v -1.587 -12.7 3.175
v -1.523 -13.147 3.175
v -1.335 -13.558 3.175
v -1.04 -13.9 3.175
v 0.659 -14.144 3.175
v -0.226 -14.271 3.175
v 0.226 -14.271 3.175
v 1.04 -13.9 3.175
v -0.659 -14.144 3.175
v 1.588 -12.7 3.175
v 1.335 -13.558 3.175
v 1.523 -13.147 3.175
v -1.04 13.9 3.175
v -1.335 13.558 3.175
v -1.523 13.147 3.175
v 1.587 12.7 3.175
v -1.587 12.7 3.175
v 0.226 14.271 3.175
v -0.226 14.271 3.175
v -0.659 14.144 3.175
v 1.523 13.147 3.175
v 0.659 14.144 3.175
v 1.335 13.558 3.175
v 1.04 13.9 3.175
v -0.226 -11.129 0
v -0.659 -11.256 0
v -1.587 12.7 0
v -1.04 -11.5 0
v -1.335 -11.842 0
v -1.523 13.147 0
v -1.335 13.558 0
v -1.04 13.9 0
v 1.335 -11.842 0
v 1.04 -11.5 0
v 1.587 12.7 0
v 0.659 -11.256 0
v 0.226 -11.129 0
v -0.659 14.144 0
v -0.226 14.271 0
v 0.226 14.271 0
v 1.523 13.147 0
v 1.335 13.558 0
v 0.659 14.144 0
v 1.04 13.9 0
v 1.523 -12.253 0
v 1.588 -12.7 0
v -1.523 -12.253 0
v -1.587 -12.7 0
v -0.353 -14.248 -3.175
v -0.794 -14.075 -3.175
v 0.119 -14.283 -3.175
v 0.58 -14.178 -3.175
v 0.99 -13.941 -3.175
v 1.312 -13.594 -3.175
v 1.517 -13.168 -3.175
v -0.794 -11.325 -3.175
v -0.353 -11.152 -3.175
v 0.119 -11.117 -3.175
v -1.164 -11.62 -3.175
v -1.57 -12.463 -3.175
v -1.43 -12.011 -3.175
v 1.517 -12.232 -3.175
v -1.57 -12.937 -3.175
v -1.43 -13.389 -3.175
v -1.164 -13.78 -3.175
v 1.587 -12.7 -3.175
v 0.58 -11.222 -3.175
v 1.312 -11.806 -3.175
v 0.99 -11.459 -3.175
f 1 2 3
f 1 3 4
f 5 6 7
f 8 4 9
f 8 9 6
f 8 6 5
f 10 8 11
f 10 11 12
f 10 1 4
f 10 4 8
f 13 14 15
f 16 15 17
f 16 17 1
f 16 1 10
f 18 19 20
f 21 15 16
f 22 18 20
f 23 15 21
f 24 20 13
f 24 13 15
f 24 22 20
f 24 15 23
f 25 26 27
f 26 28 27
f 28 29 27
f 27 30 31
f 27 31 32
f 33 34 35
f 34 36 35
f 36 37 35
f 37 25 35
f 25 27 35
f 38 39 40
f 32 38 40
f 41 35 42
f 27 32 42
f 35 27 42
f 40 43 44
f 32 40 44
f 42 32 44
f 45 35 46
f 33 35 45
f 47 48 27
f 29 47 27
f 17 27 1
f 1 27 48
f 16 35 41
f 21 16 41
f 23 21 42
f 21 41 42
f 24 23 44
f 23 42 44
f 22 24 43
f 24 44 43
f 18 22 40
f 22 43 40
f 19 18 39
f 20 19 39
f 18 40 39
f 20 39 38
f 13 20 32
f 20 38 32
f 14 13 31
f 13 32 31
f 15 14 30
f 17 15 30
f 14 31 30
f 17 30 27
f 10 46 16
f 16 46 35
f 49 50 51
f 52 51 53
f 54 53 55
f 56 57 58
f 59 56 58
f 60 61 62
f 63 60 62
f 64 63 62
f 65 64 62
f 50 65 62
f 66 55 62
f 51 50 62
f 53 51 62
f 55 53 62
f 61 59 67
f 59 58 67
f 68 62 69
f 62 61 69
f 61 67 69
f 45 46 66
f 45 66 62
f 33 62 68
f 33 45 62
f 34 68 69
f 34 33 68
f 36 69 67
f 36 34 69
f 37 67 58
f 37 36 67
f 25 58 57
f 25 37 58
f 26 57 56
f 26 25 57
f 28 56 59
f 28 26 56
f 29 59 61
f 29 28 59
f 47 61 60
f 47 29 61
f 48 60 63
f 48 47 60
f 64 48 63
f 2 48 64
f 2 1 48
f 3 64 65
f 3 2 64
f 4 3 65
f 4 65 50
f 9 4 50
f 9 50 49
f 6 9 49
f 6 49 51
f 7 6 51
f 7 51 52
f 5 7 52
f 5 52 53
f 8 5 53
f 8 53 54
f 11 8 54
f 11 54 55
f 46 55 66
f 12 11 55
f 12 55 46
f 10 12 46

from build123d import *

# Parameters (mm, degrees)
F1_DEPTH = 3.175
F2_DEPTH = 3.175


with BuildPart() as f1:
    # F0 (on Top) → F1 (new body)
    with BuildSketch(Plane.XY):
        with BuildLine():
            ThreePointArc((1.5875, 12.7), (0, 11.1125), (-1.5875, 12.7))
            Line((-1.5875, 12.7), (-1.5875, -12.7))
            ThreePointArc((-1.5875, -12.7), (0, -11.1125), (1.5875, -12.7))
            Line((1.5875, -12.7), (1.5875, 12.7))
        make_face()
        with BuildLine():
            ThreePointArc((1.5875, -12.7), (0, -11.1125), (-1.5875, -12.7))
            Line((-1.5875, -12.7), (1.5875, -12.7))
        make_face()
        with BuildLine():
            Line((1.5875, -12.7), (-1.5875, -12.7))
            ThreePointArc((-1.5875, -12.7), (0, -14.2875), (1.5875, -12.7))
        make_face()
        with BuildLine():
            ThreePointArc((1.5875, 12.7), (0, 14.2875), (-1.5875, 12.7))
            Line((-1.5875, 12.7), (1.5875, 12.7))
        make_face()
        with BuildLine():
            Line((1.5875, 12.7), (-1.5875, 12.7))
            ThreePointArc((-1.5875, 12.7), (0, 11.1125), (1.5875, 12.7))
        make_face()
    extrude(amount=F1_DEPTH)

    # F0 (on Top) → F2 (join)
    with BuildSketch(Plane.XY):
        with BuildLine():
            Line((1.5875, -12.7), (-1.5875, -12.7))
            ThreePointArc((-1.5875, -12.7), (0, -14.2875), (1.5875, -12.7))
        make_face()
        with BuildLine():
            ThreePointArc((1.5875, -12.7), (0, -11.1125), (-1.5875, -12.7))
            Line((-1.5875, -12.7), (1.5875, -12.7))
        make_face()
    extrude(amount=-F2_DEPTH)


solid = f1.part
